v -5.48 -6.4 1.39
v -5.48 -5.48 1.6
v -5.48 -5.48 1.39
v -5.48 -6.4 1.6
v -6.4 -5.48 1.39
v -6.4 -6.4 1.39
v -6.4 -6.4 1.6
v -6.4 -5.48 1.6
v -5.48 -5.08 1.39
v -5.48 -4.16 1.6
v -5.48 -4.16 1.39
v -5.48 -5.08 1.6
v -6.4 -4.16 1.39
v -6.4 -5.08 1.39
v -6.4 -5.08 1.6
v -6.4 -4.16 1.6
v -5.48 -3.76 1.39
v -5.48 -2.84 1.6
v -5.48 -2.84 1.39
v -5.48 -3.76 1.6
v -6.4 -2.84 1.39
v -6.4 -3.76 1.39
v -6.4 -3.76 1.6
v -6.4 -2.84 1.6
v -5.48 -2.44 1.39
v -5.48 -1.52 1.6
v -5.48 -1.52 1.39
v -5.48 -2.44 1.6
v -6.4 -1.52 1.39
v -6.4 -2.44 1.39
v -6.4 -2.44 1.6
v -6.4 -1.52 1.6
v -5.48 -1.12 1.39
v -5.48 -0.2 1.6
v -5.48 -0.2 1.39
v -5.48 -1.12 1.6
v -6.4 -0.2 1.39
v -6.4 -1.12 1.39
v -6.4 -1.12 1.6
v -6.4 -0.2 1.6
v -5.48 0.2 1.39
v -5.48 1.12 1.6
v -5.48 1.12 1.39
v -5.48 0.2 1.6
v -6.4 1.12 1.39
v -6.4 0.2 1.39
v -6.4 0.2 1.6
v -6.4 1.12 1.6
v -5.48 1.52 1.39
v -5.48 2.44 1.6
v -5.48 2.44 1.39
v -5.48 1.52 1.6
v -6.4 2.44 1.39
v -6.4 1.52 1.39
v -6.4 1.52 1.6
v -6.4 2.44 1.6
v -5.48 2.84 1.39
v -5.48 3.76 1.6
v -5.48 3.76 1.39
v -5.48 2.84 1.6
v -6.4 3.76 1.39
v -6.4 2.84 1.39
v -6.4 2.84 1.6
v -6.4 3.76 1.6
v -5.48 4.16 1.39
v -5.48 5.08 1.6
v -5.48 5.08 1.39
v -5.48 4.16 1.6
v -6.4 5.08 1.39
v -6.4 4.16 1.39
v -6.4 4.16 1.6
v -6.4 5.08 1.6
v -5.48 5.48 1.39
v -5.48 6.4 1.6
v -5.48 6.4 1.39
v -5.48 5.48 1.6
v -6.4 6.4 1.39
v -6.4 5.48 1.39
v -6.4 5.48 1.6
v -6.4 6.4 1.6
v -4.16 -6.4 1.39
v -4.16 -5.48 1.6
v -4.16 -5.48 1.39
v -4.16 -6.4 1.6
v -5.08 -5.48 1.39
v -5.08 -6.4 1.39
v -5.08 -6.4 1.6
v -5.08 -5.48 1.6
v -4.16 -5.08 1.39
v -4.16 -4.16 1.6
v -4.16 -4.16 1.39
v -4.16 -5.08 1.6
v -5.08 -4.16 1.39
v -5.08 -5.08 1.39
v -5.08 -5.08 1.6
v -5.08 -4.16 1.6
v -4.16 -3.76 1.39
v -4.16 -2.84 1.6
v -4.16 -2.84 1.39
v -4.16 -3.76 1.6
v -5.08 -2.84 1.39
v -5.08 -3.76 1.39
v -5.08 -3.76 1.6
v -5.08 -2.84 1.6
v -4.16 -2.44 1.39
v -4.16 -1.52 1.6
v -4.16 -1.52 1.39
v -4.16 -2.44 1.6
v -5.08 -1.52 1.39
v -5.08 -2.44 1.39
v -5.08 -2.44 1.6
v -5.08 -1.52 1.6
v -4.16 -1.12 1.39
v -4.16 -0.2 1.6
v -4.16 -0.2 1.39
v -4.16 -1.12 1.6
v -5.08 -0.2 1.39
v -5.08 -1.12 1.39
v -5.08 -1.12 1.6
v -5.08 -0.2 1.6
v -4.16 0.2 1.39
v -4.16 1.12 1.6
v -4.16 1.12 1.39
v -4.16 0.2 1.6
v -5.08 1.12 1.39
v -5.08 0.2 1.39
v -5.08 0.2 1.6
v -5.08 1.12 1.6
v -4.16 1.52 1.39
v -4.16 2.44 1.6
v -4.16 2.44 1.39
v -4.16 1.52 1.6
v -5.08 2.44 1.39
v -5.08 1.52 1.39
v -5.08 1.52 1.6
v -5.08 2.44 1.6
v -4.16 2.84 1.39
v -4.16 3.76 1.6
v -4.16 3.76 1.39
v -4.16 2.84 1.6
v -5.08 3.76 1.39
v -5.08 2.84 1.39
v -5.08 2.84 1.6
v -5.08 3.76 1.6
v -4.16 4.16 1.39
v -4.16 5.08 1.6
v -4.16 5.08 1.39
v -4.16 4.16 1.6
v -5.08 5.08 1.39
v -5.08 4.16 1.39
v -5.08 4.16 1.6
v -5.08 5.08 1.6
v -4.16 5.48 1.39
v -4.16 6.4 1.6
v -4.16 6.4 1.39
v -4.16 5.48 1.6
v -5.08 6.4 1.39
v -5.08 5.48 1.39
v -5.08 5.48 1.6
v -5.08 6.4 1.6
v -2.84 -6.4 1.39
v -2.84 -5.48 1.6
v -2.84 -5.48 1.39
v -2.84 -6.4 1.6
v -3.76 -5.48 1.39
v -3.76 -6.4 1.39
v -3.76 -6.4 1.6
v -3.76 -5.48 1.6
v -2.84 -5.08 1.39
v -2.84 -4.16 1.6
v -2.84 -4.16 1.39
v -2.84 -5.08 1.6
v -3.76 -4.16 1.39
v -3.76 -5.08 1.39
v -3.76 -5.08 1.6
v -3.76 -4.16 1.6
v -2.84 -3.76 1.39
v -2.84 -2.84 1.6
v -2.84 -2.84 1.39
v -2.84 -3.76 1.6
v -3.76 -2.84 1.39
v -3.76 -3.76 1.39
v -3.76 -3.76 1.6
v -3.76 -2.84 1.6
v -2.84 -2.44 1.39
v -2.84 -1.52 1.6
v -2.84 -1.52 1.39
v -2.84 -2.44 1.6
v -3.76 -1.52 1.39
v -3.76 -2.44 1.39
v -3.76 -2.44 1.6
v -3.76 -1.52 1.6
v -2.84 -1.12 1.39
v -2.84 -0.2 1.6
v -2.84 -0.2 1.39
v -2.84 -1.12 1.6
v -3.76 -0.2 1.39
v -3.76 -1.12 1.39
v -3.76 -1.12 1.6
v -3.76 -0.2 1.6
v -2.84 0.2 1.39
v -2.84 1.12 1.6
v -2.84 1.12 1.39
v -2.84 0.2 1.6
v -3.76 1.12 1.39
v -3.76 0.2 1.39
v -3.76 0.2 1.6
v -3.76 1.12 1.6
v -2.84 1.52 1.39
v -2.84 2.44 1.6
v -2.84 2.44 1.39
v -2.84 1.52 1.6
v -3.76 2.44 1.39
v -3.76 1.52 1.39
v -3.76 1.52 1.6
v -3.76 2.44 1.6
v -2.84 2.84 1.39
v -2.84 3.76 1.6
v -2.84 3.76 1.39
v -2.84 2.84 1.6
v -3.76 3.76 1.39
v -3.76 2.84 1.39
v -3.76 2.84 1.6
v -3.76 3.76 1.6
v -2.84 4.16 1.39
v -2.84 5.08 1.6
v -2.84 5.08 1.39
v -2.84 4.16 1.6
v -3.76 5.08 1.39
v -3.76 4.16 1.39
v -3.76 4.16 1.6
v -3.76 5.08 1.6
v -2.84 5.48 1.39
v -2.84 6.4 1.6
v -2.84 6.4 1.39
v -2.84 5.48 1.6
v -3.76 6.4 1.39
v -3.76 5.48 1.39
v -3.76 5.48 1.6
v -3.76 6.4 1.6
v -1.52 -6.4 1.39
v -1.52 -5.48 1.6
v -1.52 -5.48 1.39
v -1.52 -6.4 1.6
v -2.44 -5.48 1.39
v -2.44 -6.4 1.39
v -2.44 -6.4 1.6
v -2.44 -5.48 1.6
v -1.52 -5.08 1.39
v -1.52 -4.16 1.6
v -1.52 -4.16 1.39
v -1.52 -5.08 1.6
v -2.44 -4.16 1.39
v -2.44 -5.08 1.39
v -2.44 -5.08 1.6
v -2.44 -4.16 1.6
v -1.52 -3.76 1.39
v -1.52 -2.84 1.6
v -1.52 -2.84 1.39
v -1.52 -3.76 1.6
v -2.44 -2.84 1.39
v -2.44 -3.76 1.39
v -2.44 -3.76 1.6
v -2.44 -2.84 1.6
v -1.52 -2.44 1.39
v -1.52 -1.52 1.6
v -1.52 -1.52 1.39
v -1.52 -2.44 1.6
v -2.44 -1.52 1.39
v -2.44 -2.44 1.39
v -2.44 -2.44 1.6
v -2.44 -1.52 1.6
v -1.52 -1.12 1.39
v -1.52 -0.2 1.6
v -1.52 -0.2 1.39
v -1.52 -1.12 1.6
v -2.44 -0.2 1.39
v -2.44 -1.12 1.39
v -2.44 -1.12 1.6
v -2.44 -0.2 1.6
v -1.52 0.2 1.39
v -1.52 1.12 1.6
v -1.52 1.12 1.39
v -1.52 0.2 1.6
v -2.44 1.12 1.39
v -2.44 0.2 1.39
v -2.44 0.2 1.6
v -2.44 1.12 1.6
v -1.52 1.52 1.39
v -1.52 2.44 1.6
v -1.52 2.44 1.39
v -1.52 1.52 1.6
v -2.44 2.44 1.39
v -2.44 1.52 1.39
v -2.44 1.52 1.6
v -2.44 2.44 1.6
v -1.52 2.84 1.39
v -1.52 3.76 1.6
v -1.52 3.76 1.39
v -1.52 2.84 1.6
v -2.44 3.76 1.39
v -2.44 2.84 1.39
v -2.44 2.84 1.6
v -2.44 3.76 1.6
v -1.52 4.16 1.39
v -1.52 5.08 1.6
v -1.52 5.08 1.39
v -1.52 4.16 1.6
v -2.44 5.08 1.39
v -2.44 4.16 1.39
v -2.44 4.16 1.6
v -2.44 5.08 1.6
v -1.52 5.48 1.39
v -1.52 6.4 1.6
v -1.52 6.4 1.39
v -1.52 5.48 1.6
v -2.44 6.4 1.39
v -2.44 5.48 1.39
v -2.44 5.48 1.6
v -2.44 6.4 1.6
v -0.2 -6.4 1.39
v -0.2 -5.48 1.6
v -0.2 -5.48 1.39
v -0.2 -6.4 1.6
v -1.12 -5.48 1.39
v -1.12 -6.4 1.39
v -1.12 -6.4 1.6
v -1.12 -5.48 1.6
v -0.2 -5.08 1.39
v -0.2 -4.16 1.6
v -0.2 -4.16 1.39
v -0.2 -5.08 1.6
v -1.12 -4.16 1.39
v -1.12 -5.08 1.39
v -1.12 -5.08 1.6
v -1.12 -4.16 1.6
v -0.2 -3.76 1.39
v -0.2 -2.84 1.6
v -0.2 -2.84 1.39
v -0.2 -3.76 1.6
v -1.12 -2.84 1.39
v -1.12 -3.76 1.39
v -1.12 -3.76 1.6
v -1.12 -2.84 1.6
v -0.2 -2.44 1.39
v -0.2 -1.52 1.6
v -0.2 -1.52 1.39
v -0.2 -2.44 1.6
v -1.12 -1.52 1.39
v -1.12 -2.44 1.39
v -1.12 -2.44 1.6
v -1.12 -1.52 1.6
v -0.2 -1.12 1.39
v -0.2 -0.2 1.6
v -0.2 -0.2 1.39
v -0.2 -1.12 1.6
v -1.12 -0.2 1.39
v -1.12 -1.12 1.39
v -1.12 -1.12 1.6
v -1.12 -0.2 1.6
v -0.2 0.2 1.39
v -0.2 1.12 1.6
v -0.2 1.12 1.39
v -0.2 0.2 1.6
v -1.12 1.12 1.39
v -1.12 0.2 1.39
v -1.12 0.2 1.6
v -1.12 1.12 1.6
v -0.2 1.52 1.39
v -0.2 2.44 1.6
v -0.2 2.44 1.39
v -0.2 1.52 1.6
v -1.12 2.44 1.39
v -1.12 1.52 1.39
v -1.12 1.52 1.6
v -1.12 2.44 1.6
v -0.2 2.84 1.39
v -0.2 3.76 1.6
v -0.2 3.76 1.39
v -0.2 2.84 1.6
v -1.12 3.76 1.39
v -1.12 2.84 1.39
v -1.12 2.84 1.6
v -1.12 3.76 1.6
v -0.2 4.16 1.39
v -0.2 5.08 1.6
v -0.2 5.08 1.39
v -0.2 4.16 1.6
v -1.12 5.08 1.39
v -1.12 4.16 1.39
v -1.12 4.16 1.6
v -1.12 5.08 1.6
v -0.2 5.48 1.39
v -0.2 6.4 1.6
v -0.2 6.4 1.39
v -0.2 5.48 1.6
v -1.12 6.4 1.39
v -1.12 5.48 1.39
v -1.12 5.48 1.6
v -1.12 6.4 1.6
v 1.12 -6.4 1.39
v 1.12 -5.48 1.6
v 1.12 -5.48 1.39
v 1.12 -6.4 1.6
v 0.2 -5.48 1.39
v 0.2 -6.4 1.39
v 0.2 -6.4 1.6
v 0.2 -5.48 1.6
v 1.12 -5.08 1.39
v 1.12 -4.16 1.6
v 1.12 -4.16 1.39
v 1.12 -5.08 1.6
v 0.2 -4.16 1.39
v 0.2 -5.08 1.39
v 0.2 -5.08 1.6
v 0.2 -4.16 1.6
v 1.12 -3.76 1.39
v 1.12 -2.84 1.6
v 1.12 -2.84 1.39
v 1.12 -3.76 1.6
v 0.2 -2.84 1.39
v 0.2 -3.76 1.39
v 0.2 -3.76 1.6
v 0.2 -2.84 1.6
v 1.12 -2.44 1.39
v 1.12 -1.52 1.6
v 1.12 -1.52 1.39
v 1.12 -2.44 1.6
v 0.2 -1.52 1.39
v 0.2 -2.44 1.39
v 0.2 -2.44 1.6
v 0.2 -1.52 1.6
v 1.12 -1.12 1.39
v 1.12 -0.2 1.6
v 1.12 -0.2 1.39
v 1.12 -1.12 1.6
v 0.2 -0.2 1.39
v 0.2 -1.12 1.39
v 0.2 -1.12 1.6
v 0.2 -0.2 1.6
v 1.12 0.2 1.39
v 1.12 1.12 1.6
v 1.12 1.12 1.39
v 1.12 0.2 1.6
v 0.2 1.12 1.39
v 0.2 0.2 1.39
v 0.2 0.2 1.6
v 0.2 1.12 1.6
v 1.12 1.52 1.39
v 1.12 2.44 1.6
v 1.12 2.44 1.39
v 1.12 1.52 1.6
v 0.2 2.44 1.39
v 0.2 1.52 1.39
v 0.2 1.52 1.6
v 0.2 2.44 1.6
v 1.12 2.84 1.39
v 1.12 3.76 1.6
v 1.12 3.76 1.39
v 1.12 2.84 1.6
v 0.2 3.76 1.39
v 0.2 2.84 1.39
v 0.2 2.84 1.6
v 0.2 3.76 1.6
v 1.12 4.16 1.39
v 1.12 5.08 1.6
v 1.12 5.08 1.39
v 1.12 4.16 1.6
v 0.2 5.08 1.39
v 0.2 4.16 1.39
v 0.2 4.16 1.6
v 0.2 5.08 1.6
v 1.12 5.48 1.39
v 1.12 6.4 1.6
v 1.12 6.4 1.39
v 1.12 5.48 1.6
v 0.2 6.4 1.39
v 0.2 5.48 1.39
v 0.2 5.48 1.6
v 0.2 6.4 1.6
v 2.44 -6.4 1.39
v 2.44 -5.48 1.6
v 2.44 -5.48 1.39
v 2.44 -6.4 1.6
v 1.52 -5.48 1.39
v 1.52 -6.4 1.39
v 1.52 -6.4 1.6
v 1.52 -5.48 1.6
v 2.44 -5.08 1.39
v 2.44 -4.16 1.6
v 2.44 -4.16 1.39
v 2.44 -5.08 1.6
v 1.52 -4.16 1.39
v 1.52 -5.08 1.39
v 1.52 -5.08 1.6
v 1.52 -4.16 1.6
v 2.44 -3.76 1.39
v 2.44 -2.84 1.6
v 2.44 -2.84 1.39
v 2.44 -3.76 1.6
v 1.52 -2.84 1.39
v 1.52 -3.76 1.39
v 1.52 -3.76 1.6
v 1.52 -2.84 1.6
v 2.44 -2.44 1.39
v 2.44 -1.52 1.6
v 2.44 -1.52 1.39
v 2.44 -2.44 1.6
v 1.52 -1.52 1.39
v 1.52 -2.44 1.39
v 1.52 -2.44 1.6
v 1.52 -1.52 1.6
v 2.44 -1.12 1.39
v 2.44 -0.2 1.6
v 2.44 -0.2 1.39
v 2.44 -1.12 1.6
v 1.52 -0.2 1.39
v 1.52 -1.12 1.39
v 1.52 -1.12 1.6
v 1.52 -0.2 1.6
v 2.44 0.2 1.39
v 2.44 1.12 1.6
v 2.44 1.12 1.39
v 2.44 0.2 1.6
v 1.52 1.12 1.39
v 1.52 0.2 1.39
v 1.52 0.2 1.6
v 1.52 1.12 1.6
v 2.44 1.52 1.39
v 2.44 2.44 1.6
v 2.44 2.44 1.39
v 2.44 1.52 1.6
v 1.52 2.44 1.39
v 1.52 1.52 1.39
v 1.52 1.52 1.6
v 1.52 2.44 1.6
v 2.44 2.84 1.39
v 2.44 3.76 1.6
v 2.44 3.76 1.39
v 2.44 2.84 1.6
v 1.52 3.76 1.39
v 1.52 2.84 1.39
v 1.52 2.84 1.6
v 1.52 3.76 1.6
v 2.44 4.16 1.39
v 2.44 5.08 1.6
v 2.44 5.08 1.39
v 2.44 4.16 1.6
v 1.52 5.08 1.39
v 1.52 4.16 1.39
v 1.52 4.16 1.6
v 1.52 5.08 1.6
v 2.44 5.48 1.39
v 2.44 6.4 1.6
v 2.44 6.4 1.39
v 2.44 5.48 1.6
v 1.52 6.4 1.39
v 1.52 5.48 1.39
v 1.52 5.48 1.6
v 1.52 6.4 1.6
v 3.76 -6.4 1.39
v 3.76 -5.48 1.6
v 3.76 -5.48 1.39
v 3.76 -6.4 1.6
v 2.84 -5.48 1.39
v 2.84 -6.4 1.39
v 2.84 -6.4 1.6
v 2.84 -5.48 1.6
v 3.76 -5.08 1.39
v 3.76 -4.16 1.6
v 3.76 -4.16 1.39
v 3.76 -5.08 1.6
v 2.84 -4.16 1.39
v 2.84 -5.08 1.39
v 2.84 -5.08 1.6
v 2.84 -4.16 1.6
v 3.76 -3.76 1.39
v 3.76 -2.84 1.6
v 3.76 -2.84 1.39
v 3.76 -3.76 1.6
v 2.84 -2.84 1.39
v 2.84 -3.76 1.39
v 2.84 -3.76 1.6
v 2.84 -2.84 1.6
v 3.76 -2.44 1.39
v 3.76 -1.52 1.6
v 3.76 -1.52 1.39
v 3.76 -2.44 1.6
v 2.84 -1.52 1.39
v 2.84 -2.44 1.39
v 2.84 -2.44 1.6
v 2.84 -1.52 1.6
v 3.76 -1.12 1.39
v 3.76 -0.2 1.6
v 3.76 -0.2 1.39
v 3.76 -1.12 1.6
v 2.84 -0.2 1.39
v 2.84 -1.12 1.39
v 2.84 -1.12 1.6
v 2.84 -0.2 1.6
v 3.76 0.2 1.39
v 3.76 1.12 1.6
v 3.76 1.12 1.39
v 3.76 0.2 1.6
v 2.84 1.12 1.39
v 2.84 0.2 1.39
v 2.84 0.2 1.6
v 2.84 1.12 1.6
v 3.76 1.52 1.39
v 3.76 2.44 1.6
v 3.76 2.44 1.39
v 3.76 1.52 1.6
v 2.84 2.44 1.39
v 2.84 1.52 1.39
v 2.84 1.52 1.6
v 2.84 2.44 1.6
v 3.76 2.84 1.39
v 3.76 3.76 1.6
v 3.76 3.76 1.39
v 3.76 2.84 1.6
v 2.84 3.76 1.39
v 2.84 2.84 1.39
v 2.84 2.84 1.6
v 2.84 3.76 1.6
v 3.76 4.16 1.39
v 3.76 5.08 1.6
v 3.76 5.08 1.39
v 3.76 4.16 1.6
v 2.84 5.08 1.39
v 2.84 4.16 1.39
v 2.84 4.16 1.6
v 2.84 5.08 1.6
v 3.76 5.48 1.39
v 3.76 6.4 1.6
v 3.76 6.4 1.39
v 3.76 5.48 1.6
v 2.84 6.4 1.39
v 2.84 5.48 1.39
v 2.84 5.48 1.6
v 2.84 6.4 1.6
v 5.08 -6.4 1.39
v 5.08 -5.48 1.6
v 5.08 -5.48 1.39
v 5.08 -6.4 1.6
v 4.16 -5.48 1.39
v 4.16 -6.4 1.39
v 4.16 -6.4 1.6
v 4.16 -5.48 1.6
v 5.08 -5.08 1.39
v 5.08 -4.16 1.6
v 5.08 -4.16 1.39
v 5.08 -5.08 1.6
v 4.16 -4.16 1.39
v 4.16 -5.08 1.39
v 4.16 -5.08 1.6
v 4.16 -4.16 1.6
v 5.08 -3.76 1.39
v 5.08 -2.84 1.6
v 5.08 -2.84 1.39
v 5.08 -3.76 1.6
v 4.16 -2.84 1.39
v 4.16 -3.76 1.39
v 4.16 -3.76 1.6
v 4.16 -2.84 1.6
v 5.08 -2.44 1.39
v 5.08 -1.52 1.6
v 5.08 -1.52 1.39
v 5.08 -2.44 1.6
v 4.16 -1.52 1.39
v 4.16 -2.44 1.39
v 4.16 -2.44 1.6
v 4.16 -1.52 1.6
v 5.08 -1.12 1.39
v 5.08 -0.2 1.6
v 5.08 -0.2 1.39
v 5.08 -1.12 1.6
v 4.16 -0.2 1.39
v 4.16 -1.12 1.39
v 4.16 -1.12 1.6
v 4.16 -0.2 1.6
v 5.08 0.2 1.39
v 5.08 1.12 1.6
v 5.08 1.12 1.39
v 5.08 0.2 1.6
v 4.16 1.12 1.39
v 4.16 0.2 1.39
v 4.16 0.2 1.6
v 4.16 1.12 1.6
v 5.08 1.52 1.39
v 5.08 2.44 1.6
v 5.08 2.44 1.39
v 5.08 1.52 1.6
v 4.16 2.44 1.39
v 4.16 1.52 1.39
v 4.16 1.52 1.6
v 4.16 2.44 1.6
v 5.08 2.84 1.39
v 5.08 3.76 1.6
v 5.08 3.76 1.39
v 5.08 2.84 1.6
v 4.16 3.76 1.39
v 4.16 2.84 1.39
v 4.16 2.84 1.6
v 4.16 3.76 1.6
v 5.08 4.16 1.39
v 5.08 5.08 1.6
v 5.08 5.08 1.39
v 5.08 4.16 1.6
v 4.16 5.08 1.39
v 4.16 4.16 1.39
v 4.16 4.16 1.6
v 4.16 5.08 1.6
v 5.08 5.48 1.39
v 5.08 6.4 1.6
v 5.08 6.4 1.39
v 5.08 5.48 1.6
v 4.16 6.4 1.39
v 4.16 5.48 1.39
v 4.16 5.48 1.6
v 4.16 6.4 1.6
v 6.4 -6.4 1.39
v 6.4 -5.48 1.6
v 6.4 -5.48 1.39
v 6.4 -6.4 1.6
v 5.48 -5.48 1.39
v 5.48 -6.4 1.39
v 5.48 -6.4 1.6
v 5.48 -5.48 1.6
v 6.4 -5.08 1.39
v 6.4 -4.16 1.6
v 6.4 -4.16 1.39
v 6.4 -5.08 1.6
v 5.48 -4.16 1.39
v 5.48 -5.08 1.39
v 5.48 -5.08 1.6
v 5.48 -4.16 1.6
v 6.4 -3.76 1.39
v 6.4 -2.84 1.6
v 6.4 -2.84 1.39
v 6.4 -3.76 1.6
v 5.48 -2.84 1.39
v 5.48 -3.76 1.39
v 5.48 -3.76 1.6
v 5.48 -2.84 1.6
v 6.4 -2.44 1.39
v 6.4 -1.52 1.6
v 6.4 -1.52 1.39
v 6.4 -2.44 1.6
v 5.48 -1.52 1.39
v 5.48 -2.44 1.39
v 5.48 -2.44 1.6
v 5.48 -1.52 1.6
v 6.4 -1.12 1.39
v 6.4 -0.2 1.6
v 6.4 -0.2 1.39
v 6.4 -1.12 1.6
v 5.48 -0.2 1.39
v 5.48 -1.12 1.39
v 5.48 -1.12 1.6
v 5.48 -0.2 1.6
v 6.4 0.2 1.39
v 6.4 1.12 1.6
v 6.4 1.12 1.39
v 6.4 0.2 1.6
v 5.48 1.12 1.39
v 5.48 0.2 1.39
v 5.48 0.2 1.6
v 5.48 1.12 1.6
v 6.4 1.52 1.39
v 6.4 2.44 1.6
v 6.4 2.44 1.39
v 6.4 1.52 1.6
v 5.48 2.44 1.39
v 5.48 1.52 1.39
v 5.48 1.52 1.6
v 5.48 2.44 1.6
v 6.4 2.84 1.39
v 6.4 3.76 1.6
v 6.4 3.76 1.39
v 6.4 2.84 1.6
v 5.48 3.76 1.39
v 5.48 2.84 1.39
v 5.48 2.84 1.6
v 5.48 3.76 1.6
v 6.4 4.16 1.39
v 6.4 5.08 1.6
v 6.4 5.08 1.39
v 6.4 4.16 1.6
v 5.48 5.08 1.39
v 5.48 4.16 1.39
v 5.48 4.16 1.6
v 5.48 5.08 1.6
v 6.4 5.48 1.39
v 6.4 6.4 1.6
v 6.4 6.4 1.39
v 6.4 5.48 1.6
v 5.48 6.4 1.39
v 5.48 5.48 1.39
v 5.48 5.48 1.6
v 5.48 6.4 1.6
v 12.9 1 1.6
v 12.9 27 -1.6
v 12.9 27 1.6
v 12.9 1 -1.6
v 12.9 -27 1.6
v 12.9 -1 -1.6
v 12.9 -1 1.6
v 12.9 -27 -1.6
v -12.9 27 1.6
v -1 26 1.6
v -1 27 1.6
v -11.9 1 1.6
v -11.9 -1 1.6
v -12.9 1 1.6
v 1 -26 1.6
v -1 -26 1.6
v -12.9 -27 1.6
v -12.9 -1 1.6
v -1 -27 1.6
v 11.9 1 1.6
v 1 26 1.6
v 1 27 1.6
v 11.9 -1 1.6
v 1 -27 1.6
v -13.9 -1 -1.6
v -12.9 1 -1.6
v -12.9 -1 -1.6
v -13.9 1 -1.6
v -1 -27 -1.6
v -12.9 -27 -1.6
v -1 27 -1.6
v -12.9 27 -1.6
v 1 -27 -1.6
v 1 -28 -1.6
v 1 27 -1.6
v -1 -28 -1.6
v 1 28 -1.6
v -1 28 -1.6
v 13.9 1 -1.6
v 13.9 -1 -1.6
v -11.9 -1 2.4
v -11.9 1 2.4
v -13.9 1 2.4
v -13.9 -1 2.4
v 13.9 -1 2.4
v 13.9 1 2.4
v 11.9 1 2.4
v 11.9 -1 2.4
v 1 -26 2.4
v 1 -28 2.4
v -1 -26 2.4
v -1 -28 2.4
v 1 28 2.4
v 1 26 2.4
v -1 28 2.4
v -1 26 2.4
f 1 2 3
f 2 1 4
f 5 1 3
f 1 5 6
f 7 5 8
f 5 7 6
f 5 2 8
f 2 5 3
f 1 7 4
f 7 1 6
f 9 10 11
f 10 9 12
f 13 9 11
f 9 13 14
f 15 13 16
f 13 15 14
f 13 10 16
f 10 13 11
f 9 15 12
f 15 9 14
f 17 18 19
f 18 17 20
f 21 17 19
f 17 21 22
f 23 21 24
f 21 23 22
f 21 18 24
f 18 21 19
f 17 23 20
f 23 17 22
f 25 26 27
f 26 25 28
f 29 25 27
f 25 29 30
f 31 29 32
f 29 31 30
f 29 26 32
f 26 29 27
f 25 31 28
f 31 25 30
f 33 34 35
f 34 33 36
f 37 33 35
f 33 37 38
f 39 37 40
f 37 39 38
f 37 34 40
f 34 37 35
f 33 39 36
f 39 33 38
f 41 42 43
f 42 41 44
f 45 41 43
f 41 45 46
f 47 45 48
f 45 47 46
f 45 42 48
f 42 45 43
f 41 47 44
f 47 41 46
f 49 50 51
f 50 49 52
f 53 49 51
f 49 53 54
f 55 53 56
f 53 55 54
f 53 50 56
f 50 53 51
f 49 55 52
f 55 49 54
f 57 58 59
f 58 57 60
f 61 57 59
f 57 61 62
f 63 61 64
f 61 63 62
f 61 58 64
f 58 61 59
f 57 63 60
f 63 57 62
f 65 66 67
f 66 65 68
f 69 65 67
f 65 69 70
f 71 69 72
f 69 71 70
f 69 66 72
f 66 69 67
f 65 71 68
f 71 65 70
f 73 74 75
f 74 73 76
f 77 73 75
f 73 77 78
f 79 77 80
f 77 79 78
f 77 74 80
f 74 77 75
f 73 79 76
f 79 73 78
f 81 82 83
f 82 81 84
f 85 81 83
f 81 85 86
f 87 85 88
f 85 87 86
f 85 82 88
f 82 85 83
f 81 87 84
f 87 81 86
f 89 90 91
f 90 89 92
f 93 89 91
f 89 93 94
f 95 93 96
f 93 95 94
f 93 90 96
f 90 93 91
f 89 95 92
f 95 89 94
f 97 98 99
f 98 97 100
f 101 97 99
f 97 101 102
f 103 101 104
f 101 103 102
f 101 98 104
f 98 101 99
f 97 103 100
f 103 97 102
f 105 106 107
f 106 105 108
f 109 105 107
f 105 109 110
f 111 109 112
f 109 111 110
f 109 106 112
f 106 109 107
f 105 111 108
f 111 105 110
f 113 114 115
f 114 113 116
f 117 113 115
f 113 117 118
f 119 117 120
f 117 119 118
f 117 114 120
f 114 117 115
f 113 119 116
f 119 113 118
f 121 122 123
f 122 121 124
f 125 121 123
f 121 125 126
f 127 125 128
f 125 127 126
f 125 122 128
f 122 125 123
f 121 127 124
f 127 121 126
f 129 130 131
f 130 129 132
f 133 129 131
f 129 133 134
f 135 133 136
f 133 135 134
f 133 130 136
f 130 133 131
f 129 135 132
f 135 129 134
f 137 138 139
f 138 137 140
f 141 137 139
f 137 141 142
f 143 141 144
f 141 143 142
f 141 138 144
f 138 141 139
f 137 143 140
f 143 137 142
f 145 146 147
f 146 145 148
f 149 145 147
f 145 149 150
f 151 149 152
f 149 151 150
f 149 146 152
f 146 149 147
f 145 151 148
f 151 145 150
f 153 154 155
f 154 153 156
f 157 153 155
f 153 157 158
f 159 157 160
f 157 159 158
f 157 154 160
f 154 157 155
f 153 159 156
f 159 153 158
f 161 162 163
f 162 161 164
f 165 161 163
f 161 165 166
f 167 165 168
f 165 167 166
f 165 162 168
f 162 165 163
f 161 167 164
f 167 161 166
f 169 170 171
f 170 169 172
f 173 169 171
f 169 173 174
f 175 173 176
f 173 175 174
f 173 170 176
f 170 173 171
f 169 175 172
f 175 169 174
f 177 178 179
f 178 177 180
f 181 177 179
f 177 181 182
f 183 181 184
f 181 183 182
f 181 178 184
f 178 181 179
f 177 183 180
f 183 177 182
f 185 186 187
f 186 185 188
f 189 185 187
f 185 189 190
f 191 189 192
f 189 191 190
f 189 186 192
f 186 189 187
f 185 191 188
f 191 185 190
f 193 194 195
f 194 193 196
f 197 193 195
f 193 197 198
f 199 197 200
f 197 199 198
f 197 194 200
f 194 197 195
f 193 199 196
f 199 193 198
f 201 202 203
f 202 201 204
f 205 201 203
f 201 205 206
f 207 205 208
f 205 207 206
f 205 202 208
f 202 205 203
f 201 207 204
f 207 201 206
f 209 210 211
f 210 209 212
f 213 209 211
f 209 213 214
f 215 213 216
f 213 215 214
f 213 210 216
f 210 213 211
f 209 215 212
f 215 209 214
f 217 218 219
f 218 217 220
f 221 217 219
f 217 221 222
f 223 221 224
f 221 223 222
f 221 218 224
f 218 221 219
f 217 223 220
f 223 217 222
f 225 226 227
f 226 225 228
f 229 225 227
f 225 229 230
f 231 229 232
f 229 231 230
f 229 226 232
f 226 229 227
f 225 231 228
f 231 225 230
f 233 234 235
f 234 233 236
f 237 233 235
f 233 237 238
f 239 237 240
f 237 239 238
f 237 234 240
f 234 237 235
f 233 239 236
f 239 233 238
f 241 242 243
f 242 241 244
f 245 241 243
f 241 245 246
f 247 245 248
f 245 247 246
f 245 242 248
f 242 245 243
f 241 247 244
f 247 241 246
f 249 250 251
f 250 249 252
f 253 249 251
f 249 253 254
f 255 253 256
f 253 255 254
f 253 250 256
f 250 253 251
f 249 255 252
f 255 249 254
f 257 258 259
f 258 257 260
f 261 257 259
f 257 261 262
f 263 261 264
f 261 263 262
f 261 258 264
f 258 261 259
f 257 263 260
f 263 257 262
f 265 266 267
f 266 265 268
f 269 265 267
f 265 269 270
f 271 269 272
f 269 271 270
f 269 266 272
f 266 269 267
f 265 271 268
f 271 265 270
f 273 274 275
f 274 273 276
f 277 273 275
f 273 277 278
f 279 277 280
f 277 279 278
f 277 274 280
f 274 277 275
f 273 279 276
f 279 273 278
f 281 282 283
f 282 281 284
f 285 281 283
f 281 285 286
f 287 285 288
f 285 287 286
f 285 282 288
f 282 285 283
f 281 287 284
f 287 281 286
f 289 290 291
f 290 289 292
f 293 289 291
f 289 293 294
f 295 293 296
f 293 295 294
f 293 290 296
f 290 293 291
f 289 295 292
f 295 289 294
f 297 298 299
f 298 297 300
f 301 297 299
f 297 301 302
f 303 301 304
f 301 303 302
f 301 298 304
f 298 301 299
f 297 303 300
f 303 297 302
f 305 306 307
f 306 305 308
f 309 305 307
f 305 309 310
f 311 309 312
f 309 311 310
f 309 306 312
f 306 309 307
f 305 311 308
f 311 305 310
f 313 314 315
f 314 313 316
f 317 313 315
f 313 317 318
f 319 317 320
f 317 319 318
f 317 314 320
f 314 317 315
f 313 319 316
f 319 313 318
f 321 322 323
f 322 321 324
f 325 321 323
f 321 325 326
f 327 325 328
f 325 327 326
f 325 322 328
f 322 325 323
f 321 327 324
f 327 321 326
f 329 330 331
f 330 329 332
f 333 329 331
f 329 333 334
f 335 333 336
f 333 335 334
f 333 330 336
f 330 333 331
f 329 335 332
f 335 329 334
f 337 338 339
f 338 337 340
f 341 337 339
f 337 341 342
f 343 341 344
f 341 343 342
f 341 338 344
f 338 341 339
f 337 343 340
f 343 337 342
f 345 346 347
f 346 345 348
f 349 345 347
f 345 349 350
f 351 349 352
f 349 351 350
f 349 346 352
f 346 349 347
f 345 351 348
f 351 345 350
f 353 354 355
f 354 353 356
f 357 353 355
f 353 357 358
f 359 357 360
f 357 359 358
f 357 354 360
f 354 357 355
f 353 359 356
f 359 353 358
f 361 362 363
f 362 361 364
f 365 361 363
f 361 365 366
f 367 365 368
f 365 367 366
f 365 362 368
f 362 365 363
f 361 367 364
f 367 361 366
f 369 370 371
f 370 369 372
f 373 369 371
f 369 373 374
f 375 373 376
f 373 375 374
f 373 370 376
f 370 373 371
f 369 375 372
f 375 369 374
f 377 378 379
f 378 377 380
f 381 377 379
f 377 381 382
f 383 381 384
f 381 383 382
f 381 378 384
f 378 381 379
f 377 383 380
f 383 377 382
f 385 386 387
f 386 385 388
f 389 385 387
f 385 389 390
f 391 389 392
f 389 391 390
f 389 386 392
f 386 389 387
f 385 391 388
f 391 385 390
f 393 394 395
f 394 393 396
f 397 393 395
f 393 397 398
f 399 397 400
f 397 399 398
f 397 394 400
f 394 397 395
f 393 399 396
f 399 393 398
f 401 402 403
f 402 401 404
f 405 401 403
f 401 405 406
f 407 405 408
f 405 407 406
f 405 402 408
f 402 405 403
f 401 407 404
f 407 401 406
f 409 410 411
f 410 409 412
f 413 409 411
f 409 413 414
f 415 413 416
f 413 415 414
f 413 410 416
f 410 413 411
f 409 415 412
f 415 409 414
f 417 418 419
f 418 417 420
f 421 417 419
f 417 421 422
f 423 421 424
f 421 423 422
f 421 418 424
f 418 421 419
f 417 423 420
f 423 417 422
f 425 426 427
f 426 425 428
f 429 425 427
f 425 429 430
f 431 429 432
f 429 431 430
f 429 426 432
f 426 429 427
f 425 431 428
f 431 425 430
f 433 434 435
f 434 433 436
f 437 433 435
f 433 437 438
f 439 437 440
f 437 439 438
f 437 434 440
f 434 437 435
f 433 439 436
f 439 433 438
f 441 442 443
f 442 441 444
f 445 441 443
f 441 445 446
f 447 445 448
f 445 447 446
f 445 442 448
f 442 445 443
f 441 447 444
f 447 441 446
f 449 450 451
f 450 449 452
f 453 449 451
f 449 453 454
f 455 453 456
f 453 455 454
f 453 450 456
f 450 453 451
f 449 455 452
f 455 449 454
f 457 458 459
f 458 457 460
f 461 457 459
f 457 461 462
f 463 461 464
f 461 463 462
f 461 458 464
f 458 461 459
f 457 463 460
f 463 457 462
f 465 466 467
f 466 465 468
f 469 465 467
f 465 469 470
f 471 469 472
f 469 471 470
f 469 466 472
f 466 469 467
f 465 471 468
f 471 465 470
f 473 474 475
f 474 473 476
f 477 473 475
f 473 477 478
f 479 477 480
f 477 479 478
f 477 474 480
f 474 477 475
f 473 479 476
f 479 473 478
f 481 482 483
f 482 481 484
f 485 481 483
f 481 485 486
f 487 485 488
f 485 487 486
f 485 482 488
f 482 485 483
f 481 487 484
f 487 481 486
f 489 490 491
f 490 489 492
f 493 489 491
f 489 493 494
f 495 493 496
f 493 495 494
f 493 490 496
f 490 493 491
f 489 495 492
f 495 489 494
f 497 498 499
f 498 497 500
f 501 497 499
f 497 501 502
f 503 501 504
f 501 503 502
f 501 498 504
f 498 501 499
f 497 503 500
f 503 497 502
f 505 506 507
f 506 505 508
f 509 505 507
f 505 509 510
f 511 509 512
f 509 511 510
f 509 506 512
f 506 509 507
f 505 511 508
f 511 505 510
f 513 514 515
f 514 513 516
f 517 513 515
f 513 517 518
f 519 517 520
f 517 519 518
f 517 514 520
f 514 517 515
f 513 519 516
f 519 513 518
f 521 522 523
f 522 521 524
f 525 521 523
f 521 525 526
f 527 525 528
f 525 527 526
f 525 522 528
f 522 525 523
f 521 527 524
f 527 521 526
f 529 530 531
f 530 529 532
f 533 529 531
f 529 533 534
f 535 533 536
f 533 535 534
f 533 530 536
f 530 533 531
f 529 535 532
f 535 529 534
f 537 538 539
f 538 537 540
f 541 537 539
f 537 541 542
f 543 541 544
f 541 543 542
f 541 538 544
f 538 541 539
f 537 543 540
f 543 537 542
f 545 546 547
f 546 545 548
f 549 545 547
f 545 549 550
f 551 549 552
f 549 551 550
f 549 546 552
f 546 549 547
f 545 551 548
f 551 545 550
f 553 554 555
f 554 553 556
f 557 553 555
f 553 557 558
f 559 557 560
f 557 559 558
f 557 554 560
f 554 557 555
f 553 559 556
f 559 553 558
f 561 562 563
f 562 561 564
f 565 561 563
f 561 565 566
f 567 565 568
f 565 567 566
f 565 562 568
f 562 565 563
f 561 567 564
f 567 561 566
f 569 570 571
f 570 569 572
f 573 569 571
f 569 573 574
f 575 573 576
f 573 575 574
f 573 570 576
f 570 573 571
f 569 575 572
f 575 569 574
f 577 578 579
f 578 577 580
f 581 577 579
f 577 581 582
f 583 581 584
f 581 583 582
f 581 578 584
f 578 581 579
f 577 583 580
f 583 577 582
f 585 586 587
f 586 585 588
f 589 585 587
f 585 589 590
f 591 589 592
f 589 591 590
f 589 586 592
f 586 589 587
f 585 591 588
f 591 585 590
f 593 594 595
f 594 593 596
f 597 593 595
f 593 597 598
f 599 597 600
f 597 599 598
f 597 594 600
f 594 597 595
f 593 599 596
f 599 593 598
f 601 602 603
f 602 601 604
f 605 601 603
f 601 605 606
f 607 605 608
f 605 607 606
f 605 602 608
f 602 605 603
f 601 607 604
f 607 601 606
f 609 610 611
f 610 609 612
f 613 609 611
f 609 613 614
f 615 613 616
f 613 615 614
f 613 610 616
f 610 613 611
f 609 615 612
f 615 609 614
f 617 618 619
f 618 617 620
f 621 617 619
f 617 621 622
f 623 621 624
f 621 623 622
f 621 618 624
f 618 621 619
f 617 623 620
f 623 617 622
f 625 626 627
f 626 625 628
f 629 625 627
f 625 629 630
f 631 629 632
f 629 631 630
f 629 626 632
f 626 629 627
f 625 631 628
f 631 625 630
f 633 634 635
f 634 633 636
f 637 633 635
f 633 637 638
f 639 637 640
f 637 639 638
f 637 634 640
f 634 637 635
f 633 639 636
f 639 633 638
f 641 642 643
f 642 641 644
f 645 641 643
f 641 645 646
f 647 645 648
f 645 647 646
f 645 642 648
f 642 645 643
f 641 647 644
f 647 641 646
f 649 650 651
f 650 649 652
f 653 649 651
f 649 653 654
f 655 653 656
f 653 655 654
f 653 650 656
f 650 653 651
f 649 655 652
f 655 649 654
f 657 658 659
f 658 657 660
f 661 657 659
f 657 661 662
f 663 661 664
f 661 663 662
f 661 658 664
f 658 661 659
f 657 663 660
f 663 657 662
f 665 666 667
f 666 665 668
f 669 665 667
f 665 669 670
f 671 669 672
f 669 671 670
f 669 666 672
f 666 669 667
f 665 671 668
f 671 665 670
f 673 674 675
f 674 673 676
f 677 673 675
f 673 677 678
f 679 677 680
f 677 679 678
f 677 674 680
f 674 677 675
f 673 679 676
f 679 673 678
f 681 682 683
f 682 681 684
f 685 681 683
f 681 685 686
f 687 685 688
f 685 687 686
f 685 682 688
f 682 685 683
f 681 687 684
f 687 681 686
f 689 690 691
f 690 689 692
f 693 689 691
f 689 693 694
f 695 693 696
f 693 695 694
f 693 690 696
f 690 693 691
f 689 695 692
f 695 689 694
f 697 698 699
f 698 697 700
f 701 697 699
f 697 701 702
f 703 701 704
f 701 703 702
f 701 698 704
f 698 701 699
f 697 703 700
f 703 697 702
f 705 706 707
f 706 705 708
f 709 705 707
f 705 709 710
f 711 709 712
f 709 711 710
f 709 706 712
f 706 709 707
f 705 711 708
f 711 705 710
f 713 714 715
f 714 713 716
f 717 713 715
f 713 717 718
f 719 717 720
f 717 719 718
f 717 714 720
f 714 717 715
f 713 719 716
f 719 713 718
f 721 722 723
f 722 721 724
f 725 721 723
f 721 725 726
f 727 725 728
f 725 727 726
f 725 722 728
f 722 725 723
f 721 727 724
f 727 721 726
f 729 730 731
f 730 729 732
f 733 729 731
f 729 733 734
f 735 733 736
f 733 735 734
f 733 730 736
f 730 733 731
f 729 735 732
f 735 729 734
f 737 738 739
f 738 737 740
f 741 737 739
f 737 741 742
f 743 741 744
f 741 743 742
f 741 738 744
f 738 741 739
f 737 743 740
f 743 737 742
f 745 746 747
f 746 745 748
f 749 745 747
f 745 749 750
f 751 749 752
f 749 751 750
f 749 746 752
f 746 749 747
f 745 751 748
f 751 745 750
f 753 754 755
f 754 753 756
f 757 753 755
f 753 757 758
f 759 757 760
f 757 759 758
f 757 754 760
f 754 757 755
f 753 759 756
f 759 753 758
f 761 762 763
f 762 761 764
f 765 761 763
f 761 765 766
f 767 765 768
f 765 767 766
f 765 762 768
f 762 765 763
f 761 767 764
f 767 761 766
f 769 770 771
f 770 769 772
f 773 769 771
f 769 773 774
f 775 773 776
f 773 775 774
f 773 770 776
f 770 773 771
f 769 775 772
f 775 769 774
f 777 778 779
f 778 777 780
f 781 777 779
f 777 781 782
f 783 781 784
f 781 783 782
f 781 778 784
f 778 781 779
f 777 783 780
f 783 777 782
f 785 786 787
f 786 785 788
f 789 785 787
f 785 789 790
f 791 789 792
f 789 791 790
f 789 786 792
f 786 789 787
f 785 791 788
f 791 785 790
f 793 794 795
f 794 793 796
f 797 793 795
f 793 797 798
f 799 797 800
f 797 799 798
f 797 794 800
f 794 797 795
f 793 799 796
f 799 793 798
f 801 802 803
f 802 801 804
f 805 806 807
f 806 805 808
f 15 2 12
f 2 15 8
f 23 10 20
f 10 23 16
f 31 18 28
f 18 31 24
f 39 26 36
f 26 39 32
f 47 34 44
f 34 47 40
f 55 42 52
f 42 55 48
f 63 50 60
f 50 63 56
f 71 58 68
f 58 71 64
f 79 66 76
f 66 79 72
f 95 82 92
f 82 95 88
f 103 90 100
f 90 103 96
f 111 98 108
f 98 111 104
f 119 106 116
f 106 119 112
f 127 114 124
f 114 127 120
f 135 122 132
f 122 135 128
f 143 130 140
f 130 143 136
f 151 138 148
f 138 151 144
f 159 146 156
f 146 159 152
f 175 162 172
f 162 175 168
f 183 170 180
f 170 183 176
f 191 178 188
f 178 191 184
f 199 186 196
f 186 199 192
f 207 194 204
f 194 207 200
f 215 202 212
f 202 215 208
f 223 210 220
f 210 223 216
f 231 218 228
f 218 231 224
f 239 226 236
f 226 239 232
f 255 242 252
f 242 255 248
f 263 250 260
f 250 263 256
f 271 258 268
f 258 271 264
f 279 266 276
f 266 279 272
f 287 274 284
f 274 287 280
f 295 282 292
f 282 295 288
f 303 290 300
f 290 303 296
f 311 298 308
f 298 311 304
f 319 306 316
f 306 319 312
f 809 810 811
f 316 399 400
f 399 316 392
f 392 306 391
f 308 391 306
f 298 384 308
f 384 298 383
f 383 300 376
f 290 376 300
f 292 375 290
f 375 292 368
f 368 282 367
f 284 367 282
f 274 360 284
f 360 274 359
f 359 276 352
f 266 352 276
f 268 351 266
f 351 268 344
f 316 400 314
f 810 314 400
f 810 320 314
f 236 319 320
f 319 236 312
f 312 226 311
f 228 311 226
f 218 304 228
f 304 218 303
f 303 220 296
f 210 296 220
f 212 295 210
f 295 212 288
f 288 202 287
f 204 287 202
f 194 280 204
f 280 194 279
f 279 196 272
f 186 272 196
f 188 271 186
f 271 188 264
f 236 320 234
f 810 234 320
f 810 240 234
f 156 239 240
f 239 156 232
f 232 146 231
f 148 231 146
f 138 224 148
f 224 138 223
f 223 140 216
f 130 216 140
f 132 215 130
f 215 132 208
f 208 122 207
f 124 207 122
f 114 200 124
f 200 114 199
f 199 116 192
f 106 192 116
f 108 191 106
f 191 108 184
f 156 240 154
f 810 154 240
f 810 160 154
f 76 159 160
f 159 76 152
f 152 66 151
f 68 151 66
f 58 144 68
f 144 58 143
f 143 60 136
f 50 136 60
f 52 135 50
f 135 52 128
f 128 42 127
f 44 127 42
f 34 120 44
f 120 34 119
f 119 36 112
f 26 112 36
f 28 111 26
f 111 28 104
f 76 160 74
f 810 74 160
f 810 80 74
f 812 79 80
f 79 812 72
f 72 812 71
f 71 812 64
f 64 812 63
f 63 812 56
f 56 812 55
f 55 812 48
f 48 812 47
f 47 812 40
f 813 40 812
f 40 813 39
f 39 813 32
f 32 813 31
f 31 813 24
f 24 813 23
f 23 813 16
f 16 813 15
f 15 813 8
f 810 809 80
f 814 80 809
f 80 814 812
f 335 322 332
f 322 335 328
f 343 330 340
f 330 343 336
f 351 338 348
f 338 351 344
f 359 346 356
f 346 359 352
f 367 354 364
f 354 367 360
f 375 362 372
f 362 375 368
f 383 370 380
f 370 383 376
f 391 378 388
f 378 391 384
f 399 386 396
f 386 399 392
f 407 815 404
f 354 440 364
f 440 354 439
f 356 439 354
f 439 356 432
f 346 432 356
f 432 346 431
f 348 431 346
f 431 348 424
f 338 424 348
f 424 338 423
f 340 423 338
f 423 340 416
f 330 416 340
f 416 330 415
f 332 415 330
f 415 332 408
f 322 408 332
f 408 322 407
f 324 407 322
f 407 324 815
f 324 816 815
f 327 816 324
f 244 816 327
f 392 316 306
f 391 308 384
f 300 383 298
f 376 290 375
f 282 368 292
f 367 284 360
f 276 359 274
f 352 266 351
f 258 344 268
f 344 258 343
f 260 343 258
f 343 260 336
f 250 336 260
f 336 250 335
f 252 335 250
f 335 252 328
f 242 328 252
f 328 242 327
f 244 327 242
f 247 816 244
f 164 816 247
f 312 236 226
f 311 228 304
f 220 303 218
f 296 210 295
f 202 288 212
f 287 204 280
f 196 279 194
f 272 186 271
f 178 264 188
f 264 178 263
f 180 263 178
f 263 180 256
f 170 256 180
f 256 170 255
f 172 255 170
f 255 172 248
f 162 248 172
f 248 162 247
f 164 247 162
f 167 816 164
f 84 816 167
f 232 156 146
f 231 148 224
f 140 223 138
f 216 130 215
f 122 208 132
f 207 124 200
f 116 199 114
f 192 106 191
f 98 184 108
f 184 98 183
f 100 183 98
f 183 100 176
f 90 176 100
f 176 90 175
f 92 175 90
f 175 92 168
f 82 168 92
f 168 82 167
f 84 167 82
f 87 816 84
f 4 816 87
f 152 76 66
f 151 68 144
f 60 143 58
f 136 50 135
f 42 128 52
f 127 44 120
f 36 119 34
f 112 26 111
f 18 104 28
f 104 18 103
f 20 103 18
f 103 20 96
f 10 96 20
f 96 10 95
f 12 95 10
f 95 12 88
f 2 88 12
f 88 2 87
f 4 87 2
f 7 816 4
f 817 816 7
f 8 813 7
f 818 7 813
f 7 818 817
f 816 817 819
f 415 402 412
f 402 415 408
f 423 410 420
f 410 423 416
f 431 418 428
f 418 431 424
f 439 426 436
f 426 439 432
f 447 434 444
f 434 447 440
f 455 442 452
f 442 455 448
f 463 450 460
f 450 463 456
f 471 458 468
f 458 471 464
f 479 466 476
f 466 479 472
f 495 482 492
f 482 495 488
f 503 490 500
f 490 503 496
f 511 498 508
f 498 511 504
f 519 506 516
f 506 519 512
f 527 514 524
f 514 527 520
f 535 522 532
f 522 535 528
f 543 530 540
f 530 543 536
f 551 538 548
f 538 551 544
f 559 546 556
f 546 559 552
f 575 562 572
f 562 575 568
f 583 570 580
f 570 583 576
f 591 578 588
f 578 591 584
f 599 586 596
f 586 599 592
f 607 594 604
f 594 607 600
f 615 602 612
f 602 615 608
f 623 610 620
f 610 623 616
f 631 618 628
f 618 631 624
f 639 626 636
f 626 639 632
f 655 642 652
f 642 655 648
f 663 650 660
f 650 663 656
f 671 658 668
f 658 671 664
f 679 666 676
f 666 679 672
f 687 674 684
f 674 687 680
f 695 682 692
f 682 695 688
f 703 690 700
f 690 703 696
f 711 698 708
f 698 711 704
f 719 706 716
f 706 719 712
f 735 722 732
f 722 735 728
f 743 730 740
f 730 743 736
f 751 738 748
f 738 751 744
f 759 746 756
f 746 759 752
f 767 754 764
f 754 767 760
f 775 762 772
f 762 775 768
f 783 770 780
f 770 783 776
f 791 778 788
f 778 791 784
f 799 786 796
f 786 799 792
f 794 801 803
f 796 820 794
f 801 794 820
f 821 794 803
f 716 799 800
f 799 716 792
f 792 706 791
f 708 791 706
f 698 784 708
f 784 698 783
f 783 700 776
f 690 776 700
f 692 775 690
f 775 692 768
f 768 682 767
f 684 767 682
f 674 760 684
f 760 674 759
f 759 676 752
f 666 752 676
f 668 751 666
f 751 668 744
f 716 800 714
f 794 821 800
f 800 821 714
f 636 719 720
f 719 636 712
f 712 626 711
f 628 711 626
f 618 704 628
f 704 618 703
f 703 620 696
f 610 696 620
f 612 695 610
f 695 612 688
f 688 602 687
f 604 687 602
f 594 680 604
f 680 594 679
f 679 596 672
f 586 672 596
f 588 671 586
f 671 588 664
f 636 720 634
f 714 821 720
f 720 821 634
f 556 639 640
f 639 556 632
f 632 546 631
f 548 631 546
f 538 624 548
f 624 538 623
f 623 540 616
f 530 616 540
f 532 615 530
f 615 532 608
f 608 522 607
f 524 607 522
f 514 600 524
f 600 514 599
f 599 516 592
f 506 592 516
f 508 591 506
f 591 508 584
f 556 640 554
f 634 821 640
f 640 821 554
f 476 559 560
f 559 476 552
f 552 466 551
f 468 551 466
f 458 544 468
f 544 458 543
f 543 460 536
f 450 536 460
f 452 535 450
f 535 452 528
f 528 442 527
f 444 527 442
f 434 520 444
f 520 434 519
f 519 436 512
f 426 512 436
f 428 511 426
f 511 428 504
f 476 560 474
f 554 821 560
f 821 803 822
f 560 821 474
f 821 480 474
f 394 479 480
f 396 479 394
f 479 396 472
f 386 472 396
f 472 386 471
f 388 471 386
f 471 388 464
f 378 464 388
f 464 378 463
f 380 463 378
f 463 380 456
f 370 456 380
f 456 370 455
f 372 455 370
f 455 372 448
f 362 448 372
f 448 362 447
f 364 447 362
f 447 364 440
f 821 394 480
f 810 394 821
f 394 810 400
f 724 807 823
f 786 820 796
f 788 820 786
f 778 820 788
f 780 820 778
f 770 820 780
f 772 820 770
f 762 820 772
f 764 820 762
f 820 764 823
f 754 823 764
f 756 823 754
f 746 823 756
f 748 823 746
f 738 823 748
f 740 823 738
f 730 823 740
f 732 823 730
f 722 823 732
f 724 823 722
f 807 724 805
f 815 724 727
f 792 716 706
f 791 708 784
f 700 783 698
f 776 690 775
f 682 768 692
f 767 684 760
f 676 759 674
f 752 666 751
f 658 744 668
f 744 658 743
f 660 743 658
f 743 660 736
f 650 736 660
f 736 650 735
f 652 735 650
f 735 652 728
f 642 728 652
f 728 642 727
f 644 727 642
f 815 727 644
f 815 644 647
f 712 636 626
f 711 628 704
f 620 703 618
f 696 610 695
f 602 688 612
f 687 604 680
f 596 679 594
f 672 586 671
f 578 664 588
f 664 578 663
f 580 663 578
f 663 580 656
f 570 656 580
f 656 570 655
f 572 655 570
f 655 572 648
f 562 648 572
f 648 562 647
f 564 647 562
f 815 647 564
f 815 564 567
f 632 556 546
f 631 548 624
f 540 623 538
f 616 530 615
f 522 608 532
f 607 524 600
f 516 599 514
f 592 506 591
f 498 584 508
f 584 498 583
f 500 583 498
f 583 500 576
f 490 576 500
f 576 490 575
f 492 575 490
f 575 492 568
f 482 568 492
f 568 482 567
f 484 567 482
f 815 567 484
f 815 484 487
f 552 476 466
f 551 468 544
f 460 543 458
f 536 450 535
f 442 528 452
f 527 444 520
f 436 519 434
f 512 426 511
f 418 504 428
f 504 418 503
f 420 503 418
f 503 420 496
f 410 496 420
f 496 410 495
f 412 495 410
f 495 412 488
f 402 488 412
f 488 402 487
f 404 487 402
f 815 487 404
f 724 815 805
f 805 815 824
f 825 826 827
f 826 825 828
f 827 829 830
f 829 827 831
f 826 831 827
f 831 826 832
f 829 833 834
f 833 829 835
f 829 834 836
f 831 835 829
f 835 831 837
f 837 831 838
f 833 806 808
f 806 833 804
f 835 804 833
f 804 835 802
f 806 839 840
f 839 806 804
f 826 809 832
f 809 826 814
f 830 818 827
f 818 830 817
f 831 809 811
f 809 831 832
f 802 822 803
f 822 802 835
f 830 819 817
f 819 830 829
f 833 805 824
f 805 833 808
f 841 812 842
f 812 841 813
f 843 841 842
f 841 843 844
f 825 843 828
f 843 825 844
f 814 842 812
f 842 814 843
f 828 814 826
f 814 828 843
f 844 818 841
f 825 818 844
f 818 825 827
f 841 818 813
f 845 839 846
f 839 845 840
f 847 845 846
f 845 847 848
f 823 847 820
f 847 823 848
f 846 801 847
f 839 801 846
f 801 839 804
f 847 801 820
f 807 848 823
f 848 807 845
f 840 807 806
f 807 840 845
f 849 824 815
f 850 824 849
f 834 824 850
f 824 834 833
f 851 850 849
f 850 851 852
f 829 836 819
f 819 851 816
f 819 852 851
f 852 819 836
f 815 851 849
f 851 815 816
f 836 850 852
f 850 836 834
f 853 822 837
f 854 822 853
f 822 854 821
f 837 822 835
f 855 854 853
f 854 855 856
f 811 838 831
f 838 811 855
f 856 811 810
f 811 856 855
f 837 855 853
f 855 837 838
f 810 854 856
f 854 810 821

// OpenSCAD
//oocyte chamber
//updated by AM Chagas 20210506 -> larger grid
//designed by AM Chagas 20181001 CC BY 4.0 license
//inspired on the design from J Menzies.

wellx = 0.92;//0.3
welly = 0.92;//0.7
wellz = 0.22;

interwell = 0.4;

nwellsx = 10;
nwellsy = 10;

platey = wellx*nwellsx*5+8;//10

platex = welly*nwellsy*1.5+12;//14  
platez = 3.2        ;

//nwellsx = 10;
//nwellsy = 20;

landmarks = 1;

echo(platey);
echo(platex);
echo(platez);


tol = 0.1;
$fn=20;
module egg_chamber(){

/*
module grid(){
    for (x = [0:nwellsx-1]){
        for (y = [0:nwellsy-1]){
            translate([x*(wellx+interwell),y*(welly+interwell),0]){
                cube([wellx,welly,wellz],center=true);
                }//end translate
            }//end for y
    }//end for x
}//end module
*/
module grid(wellx=wellx,welly=welly,holeThrough=0){
    for (x = [-nwellsx/2+0.5:nwellsx/2-0.5]){
        for (y = [-nwellsy/2+0.5:nwellsy/2-0.5]){
            translate([x*(wellx+interwell),y*(welly+interwell),platez/2-wellz/2+0.01]){
                if(holeThrough==1){
                    cube([wellx,welly,wellz+10],center=true);
                    }//endif
                else{
                 cube([wellx,welly,wellz],center=true);
                    }
                }//end translate
            }//end for y
    }//end for x
}//end module




difference(){

//translate([-platex/2+5,-platey/2+5,-platez+wellz-0.001]){
cube([platex,platey,platez],center=true);

//}

/*
translate([0,0,0.2]){
cube([wellx*nwellsx*2+8,welly*nwellsy*2,platez],center=true);
}

*/
//    translate([0,0,-0.5]){
//        minkowski(){
//            sphere(d=0.5);
//cube([18,14,0.5],center=true);    
//        }
//}//end translate

grid(holeThrough=0);

}//end difference
if(landmarks==1){

for (x=[-platex/2,platex/2]){
translate([x,0,0.4]){
cube([2,2,4],center=true);
}//end translate
}//end for

for(y=[-platey/2,platey/2]){
translate([0,y,0.4]){
cube([2,2,4],center=true);
}//end translate
}//end for
}
} // end module egg_chamber

egg_chamber();

/*
translate([-9.5,0,0.05]){
cube([4,15,platez],center=true);
}

translate([9.5,0,0.05]){
cube([4,15,platez],center=true);
}
*/
